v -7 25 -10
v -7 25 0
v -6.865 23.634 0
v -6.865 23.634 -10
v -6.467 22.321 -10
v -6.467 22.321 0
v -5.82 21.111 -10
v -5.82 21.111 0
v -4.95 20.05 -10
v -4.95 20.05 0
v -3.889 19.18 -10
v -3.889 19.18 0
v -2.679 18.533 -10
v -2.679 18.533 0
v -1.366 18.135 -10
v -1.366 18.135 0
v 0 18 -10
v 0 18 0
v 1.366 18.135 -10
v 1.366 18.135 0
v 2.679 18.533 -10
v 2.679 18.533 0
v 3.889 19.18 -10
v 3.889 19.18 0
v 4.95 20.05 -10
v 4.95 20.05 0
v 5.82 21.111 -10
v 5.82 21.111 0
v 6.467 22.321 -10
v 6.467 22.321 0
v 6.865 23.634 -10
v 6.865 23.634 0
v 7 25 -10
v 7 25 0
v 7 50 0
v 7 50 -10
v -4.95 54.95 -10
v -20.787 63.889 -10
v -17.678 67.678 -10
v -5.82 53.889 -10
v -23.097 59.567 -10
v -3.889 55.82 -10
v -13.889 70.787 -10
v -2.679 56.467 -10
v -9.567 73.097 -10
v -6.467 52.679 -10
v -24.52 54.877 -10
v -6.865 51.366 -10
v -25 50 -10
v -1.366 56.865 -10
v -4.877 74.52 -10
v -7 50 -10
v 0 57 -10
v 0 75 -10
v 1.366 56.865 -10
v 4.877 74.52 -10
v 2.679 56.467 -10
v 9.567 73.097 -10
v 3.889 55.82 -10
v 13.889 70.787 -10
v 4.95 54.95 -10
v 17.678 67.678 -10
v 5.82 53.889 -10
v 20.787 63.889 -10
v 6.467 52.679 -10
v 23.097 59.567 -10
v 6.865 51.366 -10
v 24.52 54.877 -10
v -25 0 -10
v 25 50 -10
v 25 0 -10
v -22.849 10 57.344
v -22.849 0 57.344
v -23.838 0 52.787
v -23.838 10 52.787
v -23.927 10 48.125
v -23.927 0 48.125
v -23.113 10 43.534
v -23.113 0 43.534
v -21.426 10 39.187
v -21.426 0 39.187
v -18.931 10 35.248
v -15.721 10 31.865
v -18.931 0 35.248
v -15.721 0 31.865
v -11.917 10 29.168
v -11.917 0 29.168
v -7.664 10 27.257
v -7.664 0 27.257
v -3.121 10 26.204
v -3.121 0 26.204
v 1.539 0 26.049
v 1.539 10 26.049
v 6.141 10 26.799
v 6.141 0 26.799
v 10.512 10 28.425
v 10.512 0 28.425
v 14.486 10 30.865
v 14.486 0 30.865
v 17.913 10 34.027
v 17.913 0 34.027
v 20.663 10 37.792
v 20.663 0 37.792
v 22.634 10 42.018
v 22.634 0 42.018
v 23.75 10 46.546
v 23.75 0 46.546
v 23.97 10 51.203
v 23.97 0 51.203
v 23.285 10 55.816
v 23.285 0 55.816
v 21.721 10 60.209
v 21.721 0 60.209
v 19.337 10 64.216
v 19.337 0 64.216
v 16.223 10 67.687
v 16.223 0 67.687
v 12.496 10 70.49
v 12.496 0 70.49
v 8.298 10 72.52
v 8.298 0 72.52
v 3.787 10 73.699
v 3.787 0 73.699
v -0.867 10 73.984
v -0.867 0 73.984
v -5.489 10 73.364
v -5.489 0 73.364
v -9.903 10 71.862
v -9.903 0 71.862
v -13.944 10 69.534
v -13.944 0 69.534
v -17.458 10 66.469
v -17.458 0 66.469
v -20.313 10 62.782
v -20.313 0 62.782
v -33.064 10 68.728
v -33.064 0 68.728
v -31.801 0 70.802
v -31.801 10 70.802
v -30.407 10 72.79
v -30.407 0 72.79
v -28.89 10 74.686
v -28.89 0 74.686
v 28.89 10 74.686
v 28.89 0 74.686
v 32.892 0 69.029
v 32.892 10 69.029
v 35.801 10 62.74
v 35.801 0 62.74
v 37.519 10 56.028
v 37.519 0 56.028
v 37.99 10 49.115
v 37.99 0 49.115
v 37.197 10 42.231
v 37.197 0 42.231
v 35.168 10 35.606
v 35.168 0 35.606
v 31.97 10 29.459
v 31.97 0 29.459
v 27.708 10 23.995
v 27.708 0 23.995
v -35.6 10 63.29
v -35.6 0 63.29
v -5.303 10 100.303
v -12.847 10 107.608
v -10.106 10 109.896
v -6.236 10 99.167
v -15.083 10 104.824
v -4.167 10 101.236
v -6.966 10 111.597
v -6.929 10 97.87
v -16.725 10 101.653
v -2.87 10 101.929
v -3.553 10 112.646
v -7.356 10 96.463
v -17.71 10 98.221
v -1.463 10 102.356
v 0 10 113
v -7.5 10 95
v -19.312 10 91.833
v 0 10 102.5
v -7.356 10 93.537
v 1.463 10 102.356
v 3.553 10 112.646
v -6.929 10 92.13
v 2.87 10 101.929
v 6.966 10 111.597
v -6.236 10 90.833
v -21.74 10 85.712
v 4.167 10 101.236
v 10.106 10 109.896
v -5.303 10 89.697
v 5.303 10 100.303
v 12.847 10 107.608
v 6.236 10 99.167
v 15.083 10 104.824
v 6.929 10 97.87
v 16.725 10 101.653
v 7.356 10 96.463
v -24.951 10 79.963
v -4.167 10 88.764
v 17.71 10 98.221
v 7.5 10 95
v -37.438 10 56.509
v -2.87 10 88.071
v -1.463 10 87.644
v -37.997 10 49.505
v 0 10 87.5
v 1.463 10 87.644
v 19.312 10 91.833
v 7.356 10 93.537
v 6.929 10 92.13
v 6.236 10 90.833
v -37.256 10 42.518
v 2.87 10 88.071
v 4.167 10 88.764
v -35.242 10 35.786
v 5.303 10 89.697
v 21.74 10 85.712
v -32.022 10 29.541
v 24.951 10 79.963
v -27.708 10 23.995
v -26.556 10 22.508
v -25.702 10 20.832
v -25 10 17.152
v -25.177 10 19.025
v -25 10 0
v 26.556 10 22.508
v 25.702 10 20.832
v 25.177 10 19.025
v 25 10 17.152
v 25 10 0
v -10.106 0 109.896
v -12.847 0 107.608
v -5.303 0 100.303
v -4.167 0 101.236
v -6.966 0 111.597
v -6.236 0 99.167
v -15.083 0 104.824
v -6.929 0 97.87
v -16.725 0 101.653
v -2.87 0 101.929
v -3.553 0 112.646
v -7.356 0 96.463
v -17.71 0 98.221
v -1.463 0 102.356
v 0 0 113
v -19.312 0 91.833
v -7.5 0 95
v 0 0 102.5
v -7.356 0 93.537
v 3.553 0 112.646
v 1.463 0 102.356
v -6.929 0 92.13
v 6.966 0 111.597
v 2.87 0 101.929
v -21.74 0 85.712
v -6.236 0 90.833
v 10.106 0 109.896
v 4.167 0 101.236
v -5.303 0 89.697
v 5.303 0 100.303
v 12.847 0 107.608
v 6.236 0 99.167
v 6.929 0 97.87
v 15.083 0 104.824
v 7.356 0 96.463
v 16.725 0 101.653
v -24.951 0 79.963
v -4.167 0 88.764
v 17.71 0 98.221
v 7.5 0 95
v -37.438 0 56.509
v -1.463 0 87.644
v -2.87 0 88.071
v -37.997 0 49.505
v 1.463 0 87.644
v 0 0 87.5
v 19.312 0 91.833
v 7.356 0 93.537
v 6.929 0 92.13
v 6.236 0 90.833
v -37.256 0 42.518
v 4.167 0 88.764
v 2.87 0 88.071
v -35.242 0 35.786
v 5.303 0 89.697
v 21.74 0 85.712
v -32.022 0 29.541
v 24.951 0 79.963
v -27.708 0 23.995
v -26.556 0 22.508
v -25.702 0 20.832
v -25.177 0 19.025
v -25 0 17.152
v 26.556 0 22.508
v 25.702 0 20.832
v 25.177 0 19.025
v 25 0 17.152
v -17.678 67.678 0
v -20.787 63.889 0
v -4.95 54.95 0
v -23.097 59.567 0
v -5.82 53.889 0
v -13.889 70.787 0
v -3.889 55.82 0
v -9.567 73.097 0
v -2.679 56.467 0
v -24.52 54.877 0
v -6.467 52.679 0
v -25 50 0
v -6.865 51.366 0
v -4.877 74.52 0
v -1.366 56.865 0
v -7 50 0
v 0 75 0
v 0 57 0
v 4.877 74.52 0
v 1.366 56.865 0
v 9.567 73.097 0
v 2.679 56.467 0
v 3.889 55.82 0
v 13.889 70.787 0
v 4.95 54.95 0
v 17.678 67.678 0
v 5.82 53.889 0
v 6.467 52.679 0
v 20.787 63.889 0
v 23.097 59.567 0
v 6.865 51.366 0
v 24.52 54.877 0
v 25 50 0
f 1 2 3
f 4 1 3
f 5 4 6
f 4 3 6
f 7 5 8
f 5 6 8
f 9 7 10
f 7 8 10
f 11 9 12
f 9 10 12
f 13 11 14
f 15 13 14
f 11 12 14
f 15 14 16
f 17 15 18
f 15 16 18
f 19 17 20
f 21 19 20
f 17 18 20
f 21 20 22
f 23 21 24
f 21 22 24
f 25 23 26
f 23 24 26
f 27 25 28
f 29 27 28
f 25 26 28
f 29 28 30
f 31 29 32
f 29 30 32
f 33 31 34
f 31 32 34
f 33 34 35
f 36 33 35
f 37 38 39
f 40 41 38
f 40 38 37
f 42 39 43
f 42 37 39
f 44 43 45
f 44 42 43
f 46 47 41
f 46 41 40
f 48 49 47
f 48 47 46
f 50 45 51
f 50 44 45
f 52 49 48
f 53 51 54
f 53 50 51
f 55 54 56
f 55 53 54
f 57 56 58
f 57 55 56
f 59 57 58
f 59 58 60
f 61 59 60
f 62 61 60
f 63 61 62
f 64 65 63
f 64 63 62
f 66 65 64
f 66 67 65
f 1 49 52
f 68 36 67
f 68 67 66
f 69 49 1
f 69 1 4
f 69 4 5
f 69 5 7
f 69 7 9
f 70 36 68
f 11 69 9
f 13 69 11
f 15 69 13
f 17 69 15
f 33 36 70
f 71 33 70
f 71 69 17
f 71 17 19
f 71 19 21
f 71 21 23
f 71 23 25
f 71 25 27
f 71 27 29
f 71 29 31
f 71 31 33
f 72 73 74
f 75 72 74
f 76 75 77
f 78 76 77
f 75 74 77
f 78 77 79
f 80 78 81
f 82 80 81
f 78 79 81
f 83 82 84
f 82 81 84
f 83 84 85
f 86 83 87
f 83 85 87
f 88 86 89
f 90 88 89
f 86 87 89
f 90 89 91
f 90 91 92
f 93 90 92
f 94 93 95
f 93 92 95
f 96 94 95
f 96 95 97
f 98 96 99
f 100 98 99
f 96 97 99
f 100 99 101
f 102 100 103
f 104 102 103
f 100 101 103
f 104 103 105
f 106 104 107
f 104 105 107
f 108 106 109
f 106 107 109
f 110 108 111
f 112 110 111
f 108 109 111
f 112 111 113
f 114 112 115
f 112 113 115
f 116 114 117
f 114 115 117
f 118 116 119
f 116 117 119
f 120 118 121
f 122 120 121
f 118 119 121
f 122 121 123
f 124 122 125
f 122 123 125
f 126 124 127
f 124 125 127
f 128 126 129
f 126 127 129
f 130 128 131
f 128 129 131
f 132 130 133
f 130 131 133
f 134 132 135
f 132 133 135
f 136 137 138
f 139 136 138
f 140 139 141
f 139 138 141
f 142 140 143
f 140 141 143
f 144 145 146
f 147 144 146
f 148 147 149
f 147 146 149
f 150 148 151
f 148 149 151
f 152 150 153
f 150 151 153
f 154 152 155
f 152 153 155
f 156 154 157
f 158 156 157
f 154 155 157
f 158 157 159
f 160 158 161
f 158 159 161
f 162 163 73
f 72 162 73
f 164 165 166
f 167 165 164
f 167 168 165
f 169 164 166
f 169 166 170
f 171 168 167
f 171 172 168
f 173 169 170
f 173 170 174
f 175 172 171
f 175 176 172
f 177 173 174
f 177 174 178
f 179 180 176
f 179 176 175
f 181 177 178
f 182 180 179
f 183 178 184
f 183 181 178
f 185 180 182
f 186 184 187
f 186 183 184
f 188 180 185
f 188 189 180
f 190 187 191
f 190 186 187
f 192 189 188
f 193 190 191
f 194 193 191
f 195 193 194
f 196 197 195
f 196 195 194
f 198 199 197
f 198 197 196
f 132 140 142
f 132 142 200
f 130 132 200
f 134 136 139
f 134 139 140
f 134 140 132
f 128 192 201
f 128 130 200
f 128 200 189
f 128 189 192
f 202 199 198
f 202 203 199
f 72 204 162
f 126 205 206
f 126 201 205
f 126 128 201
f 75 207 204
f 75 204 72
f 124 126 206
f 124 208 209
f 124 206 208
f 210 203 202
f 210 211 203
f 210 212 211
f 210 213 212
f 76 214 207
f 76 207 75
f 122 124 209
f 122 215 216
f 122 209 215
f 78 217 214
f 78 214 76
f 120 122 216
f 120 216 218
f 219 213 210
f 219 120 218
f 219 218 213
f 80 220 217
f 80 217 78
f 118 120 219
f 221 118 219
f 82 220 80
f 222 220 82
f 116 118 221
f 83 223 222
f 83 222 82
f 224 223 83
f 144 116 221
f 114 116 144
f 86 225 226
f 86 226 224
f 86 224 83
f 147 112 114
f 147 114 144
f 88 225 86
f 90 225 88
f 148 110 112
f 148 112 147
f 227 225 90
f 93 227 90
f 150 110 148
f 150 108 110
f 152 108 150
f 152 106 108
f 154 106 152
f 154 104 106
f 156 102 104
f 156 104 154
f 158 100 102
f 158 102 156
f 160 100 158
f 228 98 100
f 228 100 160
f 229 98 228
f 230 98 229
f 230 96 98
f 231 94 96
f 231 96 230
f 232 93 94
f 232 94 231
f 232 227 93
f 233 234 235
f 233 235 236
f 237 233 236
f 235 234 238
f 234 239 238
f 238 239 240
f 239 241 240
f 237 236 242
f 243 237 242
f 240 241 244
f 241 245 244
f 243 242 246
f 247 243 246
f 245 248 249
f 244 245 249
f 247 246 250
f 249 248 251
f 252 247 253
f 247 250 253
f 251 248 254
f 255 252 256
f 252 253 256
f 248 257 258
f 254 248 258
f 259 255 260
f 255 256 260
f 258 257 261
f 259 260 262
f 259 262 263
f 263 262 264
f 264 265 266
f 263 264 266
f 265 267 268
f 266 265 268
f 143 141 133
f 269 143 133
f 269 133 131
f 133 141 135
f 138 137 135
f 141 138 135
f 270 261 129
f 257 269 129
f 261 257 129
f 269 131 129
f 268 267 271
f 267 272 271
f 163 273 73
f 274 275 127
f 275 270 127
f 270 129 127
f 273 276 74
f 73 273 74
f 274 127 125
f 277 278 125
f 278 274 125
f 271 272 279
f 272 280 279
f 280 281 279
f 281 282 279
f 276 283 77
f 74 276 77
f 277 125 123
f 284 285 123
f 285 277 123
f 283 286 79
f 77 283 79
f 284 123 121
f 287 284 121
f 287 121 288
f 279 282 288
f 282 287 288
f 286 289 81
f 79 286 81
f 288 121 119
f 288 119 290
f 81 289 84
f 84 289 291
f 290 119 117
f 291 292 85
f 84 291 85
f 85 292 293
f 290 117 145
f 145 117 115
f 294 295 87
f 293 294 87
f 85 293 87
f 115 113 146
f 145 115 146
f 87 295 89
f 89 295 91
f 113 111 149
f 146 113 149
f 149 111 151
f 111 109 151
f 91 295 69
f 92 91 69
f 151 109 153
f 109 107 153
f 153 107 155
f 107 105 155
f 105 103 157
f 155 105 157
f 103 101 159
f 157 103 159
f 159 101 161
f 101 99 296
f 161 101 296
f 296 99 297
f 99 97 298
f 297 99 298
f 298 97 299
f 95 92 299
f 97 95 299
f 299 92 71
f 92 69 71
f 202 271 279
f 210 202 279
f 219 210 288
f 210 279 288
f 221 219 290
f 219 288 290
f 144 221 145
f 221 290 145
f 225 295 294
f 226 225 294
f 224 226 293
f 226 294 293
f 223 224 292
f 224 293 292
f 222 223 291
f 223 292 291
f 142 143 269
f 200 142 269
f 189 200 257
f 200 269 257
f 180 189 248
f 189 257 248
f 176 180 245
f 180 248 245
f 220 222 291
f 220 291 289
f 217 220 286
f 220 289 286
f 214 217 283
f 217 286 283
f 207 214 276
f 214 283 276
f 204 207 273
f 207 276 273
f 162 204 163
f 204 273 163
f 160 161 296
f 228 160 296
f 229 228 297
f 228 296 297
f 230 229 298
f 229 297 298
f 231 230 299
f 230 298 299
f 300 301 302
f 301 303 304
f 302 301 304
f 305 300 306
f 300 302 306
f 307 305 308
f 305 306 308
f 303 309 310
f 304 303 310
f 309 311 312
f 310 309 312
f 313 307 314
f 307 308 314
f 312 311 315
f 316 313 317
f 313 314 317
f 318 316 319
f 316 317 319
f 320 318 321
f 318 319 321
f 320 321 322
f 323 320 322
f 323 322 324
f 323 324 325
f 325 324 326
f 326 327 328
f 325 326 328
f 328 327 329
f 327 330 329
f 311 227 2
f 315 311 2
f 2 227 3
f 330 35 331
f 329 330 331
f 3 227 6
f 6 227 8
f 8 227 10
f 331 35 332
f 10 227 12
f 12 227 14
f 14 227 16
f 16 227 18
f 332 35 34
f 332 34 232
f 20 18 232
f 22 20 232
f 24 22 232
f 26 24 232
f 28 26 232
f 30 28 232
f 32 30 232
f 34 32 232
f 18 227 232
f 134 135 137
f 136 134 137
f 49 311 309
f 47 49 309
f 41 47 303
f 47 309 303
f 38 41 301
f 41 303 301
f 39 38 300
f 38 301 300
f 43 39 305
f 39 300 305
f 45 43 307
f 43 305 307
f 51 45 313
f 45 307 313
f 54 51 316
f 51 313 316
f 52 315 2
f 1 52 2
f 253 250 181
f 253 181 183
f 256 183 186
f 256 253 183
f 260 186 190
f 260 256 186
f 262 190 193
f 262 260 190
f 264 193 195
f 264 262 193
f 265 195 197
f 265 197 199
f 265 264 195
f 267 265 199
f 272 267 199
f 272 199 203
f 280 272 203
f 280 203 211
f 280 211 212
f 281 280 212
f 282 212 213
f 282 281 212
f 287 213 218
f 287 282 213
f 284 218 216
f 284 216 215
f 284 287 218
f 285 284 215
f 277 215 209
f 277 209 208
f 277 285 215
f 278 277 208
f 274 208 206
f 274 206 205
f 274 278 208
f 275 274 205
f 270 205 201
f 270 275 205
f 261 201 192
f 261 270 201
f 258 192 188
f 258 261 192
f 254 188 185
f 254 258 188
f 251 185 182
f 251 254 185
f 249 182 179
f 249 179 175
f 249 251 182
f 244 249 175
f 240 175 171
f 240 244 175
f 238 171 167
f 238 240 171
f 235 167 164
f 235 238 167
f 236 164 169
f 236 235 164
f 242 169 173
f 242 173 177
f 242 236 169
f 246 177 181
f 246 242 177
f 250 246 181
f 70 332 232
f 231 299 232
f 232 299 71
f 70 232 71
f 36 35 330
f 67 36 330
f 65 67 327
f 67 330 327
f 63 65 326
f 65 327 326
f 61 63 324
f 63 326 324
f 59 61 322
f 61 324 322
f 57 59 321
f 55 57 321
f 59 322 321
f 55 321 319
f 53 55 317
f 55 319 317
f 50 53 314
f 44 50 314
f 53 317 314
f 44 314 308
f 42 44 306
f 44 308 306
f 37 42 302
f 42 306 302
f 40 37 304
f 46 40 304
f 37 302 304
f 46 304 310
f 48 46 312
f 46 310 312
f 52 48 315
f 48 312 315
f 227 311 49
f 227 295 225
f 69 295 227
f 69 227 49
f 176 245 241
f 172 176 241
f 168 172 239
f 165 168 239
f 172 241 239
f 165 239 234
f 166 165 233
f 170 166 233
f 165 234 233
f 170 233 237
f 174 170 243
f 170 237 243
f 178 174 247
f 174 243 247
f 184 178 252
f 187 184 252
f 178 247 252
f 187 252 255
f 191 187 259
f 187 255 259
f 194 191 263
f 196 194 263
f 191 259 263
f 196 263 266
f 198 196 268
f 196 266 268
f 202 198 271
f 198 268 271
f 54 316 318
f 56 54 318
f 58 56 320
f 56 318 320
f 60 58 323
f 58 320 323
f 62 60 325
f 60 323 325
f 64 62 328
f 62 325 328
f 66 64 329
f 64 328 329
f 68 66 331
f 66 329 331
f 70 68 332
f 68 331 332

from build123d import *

# Parameters (mm, degrees)
SKETCH1_R           = 7.5
BOSS_EXTRUDE1_DEPTH = 10
SKETCH1_3_W         = 50
SKETCH1_3_H         = 10
BOSS_EXTRUDE2_DEPTH = 75
CUT_EXTRUDE1_REACH  = 142.847


with BuildPart() as part:
    # Sketch1 → Boss-Extrude1 (new body)
    with BuildSketch(Plane(origin=(0, 0, 0), x_dir=(1, 0, 0), z_dir=(0, 1, 0))):
        with BuildLine():
            Line((25, 0), (-25, 0))
            Line((-25, 0), (-25, -17.151864589))
            ThreePointArc((-25, -17.151864589), (-25.701702665, -20.83176495), (-27.708333333, -23.995226133))
            ThreePointArc((-27.708333333, -23.995226133), (-37.256095308, -42.517796957), (-35.600057015, -63.29044546))
            Line((-35.600057015, -63.29044546), (-22.848639927, -57.34436202))
            ThreePointArc((-22.848639927, -57.34436202), (21.751386889, -39.857161718), (-20.312930357, -62.782208742))
            Line((-20.312930357, -62.782208742), (-33.064347445, -68.728292182))
            ThreePointArc((-33.064347445, -68.728292182), (-31.119955968, -71.807070885), (-28.889805354, -74.685606061))
            ThreePointArc((-28.889805354, -74.685606061), (-21.739686255, -85.712027428), (-17.709540124, -98.220588235))
            ThreePointArc((-17.709540124, -98.220588235), (0, -113), (17.709540124, -98.220588235))
            ThreePointArc((17.709540124, -98.220588235), (21.739686255, -85.712027428), (28.889805354, -74.685606061))
            ThreePointArc((28.889805354, -74.685606061), (37.989682547, -49.114550984), (27.708333333, -23.995226133))
            ThreePointArc((27.708333333, -23.995226133), (25.701702665, -20.83176495), (25, -17.151864589))
            Line((25, -17.151864589), (25, 0))
        make_face()
        with Locations((0, -95)):
            Circle(SKETCH1_R, mode=Mode.SUBTRACT)
    extrude(amount=BOSS_EXTRUDE1_DEPTH)

    # Sketch1<3> → Boss-Extrude2 (add)
    with BuildSketch(Plane(origin=(0, 0, 0), x_dir=(1, 0, 0), z_dir=(0, 1, 0))):
        with Locations((0, 5)):
            Rectangle(SKETCH1_3_W, SKETCH1_3_H)
    extrude(amount=BOSS_EXTRUDE2_DEPTH)

    # Sketch2 → Cut-Extrude1 (cut, up to next)
    with BuildSketch(Plane.XY, mode=Mode.PRIVATE) as cut_extrude1_sk1:
        with BuildLine():
            Line((7, 25), (7, 50))
            ThreePointArc((7, 50), (0, 57), (-7, 50))
            Line((-7, 50), (-7, 25))
            ThreePointArc((-7, 25), (0, 18), (7, 25))
        make_face()
    cut_extrude1_tool1 = extrude(cut_extrude1_sk1.sketch, amount=-CUT_EXTRUDE1_REACH, mode=Mode.PRIVATE) & part.part
    # Sketch2 → Cut-Extrude1 (cut, up to next)
    with BuildSketch(Plane.XY, mode=Mode.PRIVATE) as cut_extrude1_sk2:
        with BuildLine():
            ThreePointArc((-25, 50), (-17.67766952, 67.677669539), (2.6e-08, 75))
            Line((2.6e-08, 75), (-25, 75))
            Line((-25, 75), (-25, 50))
        make_face()
    cut_extrude1_tool2 = extrude(cut_extrude1_sk2.sketch, amount=-CUT_EXTRUDE1_REACH, mode=Mode.PRIVATE) & part.part
    # Sketch2 → Cut-Extrude1 (cut, up to next)
    with BuildSketch(Plane.XY, mode=Mode.PRIVATE) as cut_extrude1_sk3:
        with BuildLine():
            ThreePointArc((2.6e-08, 75), (17.677669539, 67.67766952), (25, 50))
            Line((25, 50), (25, 75))
            Line((25, 75), (2.6e-08, 75))
        make_face()
    cut_extrude1_tool3 = extrude(cut_extrude1_sk3.sketch, amount=-CUT_EXTRUDE1_REACH, mode=Mode.PRIVATE) & part.part
    add(cut_extrude1_tool1.solids().sort_by_distance((0, 37.5, 0))[0], mode=Mode.SUBTRACT)
    add(cut_extrude1_tool2.solids().sort_by_distance((-19.415802, 69.415802, 0))[0], mode=Mode.SUBTRACT)
    add(cut_extrude1_tool3.solids().sort_by_distance((19.415802, 69.415802, 0))[0], mode=Mode.SUBTRACT)


solid = part.part
